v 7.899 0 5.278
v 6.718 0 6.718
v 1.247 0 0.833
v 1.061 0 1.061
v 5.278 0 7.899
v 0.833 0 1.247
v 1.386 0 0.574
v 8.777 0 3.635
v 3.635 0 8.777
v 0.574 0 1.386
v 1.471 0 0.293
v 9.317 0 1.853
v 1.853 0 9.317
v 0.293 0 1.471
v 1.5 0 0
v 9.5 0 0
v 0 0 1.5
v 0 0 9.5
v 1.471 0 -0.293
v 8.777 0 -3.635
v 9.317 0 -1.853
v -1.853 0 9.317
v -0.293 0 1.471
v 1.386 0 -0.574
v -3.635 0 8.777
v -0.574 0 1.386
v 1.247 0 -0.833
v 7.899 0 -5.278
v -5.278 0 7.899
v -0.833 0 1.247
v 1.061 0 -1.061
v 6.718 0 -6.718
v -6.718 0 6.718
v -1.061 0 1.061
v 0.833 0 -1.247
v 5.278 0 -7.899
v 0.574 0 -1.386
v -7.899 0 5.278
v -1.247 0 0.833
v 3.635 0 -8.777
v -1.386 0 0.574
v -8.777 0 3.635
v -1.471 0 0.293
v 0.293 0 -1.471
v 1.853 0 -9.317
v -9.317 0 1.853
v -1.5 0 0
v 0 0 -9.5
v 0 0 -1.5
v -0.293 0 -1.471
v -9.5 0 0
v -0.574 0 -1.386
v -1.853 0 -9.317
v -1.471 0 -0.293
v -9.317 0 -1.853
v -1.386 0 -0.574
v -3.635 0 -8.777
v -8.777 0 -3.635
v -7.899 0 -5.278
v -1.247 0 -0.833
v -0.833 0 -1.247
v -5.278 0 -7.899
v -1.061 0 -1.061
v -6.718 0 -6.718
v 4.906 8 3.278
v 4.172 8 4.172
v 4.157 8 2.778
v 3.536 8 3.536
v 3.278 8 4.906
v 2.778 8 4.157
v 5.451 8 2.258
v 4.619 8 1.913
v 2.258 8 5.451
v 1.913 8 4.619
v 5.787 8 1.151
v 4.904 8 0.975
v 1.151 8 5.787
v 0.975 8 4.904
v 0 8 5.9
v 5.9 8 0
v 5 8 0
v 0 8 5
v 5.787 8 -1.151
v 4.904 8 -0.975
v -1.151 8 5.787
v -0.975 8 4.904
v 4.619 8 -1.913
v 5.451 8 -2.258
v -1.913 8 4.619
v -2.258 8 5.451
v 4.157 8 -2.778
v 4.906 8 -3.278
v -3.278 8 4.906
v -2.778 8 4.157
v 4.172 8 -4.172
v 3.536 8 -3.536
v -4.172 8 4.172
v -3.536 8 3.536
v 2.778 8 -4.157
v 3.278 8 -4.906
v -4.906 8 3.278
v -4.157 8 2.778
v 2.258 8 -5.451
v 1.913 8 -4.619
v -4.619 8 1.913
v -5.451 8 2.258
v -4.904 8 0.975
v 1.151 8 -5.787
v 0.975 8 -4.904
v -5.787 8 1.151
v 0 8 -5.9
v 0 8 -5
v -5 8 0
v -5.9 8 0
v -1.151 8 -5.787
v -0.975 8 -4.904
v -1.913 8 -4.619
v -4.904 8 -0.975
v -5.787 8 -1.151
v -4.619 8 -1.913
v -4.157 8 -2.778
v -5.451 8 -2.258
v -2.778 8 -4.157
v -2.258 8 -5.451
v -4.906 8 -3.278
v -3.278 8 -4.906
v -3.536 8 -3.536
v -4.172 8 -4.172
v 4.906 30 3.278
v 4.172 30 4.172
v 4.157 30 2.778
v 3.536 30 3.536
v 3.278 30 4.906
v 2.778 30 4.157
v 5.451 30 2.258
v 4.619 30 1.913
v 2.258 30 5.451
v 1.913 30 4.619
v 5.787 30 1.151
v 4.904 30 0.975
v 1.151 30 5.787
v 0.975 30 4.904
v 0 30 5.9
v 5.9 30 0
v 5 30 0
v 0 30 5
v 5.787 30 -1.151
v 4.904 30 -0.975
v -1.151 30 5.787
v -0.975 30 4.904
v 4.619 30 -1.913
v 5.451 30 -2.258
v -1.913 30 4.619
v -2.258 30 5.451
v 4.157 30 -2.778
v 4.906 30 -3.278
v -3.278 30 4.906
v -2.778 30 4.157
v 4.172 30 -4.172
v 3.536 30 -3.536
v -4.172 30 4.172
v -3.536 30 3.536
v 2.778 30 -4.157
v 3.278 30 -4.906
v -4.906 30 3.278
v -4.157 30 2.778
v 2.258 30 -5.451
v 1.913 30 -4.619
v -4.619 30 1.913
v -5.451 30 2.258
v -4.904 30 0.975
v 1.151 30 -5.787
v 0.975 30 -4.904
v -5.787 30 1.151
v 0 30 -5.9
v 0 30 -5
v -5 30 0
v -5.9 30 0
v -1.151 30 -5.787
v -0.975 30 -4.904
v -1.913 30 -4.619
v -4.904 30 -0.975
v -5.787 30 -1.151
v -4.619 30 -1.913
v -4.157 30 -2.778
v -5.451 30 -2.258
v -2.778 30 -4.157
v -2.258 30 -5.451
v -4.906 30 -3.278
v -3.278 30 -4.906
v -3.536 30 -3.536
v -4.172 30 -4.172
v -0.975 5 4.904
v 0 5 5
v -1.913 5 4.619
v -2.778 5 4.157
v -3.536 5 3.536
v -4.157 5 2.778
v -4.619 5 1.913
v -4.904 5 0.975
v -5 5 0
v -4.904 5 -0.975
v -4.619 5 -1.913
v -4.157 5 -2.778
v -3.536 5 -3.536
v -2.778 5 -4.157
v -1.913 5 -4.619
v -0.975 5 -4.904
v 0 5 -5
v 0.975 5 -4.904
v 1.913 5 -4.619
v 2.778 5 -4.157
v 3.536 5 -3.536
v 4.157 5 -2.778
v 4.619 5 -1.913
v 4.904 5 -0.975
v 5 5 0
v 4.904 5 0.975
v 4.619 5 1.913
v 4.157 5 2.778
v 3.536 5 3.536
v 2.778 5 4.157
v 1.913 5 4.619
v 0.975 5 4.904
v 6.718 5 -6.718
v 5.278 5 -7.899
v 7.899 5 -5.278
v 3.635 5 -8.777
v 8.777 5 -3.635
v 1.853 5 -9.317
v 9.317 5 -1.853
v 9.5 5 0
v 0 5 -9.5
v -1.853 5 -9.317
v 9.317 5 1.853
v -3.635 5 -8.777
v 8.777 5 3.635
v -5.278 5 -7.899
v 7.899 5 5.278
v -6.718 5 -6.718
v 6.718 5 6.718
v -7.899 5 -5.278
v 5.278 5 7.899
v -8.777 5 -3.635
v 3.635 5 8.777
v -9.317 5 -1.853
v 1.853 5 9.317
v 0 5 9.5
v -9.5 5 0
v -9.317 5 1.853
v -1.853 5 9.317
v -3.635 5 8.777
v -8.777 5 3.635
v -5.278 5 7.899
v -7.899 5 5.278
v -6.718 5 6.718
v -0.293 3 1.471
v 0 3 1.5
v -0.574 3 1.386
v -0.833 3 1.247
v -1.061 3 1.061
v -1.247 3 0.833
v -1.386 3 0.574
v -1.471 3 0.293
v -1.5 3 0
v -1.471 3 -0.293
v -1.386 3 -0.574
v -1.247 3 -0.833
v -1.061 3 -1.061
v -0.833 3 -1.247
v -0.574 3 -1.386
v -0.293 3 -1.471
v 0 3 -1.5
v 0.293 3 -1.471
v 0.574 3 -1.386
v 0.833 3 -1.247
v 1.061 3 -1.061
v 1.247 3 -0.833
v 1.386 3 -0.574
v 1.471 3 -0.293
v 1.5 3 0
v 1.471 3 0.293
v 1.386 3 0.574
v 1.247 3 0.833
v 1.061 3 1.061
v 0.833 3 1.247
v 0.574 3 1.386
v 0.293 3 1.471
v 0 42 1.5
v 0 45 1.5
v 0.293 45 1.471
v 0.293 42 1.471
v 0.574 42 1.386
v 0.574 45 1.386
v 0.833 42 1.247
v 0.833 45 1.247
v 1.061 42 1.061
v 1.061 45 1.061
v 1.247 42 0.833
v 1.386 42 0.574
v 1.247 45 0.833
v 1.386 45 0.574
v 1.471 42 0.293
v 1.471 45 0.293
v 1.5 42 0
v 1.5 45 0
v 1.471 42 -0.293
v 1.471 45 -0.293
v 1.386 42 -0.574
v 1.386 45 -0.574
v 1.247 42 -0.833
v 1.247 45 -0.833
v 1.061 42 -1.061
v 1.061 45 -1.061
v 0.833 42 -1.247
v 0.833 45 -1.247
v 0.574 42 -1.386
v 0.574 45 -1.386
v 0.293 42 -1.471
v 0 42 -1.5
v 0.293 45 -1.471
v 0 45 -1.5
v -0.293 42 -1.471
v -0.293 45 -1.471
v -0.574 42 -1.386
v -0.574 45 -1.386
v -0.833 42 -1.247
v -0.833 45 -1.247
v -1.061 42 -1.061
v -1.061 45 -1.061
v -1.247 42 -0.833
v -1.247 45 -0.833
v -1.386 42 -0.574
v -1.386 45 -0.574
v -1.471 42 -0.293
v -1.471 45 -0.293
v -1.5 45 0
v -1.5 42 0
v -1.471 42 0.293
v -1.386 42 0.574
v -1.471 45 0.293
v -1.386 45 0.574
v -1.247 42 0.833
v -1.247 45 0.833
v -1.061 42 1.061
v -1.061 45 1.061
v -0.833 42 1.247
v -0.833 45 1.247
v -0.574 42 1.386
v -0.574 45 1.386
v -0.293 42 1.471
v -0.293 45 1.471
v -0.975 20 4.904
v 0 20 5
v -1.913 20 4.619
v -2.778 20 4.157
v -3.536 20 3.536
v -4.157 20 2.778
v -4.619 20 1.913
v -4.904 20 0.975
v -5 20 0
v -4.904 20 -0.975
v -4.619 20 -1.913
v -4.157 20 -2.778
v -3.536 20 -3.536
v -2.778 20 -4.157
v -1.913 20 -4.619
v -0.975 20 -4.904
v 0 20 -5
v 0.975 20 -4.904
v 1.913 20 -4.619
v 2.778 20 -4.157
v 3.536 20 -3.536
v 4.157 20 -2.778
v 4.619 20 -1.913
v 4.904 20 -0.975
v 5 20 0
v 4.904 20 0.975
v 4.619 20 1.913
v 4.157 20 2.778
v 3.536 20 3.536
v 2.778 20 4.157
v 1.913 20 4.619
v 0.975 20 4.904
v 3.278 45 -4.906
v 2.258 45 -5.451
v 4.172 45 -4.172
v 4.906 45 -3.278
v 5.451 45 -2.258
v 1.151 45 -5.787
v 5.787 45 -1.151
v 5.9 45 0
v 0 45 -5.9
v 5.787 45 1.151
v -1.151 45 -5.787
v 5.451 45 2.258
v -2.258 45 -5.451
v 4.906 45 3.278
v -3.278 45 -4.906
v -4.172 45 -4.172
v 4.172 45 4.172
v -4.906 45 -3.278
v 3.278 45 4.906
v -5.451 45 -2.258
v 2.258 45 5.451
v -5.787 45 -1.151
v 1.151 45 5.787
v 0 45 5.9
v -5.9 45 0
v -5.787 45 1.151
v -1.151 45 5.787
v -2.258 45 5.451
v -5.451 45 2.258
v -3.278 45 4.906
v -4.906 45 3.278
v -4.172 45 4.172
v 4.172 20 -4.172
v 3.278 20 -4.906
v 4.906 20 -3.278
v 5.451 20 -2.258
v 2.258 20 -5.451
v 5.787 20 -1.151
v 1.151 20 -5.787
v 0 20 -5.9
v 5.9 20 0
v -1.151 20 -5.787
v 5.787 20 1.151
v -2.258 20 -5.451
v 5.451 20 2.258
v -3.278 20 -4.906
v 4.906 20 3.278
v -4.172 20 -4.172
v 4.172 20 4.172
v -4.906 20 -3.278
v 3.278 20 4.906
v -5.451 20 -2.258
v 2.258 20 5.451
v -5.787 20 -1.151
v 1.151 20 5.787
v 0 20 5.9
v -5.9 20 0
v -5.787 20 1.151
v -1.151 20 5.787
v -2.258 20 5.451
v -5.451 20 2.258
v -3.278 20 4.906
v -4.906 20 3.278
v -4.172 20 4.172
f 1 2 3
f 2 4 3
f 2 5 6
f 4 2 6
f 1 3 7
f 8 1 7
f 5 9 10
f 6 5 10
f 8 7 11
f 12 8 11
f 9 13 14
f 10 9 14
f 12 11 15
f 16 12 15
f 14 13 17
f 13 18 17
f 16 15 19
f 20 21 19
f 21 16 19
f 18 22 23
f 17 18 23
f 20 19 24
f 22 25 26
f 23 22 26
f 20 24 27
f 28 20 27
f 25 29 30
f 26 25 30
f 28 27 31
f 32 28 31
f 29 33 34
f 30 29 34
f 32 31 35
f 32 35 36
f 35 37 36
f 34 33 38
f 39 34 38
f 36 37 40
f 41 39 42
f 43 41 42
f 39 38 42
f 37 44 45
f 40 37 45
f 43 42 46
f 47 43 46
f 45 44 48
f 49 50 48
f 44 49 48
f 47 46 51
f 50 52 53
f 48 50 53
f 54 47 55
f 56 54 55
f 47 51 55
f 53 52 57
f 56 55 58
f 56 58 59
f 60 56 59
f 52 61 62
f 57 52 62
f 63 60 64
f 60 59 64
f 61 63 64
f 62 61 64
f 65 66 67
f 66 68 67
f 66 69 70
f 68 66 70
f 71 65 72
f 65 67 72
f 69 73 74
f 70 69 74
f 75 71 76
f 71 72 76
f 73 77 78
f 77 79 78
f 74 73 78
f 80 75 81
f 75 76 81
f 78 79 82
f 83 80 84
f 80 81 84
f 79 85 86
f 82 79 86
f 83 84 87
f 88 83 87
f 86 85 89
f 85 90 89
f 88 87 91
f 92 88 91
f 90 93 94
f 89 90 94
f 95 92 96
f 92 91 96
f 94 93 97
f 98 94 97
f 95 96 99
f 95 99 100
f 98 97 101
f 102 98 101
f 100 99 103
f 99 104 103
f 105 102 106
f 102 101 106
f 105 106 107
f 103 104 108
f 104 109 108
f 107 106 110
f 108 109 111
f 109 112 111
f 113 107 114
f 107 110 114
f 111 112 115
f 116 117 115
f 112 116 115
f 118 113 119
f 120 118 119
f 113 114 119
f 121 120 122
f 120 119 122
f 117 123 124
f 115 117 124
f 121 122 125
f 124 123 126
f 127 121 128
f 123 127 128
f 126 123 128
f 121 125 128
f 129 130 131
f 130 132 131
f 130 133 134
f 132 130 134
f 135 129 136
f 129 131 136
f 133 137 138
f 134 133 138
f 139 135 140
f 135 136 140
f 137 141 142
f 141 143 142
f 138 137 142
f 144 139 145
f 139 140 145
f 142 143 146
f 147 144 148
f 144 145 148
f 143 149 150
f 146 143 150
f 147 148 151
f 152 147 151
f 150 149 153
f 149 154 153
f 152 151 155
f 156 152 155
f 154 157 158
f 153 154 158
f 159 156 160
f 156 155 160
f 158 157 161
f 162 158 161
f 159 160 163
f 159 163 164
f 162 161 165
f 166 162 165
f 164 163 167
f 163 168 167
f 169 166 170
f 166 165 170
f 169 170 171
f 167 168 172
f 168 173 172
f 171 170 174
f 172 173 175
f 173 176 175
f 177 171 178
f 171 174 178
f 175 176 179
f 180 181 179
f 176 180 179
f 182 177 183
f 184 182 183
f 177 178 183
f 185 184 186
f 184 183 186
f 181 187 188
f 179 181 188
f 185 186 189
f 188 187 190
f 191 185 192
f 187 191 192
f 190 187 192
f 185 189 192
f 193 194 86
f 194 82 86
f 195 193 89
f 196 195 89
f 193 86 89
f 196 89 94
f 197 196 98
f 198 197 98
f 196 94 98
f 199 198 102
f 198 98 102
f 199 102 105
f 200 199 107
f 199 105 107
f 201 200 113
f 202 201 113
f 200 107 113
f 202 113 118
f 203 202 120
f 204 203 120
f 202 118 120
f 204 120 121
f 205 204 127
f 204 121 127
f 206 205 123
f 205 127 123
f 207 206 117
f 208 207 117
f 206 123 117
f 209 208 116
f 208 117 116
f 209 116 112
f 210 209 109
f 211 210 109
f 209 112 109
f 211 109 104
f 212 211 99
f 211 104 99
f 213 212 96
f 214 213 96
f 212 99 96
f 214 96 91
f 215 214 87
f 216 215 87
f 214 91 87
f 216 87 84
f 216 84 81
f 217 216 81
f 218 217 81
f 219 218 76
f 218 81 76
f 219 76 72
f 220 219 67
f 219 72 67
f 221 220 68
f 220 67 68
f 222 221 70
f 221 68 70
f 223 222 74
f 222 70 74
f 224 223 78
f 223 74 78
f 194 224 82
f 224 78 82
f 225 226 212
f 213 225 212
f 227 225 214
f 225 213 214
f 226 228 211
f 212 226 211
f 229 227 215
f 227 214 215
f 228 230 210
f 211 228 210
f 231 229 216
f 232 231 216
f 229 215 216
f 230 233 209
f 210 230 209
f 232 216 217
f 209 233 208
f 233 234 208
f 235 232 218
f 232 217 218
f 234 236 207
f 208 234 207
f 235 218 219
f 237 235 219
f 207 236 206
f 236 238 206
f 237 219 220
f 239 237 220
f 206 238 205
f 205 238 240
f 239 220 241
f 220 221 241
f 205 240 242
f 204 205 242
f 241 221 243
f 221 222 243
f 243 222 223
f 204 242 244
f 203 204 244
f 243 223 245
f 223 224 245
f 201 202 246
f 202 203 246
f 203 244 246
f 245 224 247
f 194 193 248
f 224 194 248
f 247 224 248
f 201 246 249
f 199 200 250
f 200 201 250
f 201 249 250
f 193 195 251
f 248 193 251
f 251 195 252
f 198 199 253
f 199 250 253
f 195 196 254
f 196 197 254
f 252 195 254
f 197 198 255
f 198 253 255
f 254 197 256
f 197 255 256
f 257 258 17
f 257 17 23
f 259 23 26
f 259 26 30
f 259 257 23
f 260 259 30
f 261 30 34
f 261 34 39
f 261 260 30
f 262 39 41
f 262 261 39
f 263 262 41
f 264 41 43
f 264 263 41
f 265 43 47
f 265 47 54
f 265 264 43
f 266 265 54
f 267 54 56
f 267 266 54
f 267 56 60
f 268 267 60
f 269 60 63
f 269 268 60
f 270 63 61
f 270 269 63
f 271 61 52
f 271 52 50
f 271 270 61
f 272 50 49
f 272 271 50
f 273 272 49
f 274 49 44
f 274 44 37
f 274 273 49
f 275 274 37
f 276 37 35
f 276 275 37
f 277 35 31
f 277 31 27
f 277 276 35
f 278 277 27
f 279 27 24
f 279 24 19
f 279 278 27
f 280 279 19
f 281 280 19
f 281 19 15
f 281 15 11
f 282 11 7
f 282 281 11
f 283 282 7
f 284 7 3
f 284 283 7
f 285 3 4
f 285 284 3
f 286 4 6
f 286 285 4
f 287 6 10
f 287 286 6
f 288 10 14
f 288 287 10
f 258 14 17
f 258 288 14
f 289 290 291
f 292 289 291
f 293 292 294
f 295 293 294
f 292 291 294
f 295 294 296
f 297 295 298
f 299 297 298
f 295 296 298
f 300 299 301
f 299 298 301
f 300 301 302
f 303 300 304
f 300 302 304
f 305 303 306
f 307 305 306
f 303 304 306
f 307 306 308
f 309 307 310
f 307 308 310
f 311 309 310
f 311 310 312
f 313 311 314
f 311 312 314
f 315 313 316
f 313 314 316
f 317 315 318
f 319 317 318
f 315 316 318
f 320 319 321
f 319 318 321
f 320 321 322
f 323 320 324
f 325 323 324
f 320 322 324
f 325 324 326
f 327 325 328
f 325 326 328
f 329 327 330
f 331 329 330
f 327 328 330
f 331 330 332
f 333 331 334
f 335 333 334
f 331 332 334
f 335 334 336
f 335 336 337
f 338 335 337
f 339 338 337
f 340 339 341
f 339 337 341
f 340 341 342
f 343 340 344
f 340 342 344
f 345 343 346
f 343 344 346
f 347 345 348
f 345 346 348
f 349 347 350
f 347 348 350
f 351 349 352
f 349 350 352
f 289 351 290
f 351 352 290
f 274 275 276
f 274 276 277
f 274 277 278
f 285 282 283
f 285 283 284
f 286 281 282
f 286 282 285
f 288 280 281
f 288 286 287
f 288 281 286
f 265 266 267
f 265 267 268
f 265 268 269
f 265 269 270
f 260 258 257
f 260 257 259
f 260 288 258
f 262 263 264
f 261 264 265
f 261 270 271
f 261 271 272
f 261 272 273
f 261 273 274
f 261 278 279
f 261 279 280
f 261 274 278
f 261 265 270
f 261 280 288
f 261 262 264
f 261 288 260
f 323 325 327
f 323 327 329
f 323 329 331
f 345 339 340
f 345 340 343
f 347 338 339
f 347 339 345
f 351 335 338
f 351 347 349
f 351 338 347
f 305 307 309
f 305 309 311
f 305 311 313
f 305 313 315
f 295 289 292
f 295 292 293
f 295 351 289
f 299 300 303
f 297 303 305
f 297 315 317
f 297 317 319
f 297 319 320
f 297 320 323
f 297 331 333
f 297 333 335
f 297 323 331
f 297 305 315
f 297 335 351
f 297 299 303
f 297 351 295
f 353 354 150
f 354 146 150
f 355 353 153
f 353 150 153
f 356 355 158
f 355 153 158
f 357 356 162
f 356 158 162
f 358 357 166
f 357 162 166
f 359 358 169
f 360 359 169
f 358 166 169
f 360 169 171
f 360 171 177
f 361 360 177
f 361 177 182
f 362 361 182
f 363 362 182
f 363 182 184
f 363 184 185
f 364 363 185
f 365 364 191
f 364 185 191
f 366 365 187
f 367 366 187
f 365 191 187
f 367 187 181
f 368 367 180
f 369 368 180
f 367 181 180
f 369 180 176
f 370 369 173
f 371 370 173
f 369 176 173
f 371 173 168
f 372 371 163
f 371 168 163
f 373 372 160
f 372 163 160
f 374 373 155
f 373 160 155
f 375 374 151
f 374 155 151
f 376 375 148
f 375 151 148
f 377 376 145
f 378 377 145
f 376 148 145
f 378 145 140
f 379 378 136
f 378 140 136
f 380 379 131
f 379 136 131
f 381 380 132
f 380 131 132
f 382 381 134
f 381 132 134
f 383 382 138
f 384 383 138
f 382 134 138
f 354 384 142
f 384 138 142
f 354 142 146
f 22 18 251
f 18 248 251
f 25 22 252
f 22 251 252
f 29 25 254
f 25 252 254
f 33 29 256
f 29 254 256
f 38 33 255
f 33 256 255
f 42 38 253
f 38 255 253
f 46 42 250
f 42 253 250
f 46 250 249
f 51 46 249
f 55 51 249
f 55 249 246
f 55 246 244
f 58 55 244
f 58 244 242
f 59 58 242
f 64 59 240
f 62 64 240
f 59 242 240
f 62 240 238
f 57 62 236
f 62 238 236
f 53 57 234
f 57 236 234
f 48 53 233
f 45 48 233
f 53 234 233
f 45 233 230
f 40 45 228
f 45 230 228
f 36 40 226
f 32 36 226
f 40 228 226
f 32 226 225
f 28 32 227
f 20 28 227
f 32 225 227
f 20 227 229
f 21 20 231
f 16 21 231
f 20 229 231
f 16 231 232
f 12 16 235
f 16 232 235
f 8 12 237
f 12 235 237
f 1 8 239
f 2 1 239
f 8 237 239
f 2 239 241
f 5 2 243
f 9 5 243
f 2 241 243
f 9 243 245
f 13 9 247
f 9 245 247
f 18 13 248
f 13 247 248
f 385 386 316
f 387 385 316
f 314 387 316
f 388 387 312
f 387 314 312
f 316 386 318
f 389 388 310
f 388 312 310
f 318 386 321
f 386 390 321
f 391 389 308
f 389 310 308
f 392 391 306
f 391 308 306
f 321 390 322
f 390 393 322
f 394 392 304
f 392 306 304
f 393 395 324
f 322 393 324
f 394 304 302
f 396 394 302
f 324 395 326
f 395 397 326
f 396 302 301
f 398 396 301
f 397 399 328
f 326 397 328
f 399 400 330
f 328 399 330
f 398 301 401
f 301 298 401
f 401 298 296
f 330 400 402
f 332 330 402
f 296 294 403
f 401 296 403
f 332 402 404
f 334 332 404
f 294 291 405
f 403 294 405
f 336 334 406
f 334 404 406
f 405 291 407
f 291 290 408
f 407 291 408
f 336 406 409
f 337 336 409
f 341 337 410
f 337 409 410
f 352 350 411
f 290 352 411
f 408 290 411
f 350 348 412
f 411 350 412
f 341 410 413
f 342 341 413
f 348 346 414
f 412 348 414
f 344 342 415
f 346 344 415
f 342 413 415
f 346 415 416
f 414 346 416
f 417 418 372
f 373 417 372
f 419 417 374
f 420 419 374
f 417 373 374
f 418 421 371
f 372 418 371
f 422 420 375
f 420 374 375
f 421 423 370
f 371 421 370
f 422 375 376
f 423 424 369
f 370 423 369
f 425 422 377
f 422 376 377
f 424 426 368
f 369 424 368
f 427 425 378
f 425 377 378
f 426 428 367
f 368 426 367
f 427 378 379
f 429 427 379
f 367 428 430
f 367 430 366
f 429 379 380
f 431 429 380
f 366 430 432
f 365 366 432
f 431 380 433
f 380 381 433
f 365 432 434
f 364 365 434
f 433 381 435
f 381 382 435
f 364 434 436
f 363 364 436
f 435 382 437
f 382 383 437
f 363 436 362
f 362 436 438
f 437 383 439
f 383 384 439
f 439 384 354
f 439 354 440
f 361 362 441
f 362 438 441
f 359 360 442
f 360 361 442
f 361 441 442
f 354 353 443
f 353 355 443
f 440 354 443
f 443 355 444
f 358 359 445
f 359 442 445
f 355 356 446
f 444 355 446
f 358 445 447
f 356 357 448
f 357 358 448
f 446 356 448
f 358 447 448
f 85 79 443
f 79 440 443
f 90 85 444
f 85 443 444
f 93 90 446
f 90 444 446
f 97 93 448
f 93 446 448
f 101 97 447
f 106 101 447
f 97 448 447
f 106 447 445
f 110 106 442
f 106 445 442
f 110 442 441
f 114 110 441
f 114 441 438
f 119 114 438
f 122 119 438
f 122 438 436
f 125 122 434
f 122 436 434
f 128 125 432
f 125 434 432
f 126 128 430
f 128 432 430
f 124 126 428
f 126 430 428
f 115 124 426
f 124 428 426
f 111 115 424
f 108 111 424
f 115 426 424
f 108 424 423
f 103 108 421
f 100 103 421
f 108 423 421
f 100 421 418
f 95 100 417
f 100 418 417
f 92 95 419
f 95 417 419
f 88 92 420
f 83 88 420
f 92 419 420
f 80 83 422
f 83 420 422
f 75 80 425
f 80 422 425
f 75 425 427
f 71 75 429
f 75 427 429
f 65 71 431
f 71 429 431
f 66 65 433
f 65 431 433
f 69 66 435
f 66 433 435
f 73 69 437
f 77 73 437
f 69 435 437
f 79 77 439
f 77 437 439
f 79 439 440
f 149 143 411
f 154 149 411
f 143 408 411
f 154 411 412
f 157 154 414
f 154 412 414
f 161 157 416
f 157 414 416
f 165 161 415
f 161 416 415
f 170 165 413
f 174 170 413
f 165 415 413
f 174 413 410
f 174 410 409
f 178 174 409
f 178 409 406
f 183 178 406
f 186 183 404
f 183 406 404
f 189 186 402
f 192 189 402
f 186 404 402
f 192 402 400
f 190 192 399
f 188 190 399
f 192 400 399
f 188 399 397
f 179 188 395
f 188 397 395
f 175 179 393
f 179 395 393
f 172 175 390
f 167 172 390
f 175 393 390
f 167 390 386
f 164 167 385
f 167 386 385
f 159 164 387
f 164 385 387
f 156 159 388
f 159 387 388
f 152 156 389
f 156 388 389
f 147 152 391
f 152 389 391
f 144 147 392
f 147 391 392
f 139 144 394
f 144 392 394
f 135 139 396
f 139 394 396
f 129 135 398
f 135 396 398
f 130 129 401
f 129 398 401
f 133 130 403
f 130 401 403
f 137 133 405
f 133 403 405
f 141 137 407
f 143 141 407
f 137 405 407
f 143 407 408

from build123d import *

# Parameters (mm, degrees)
SKETCH_2_R          = 1.5
CUT_EXTRUDE_1_DEPTH = 3
CUT_EXTRUDE_START   = -3
SKETCH_3_R          = 1.5
CUT_EXTRUDE_2_DEPTH = 3


with BuildPart() as part:
    # Эскиз1 → Повернуть1 (revolve)
    with BuildSketch(Plane.XY, mode=Mode.PRIVATE) as revolve_1_sk:
        Polygon((0, 0), (9.5, 0), (9.5, 5), (5, 5), (5, 8), (5.9, 8), (5.9, 20), (5, 20), (5, 30), (5.9, 30), (5.9, 45), (0, 45), align=None)
    revolve(revolve_1_sk.sketch.rotate(Axis((0, 14.6467512, 0), (0, -1, 0)), 90), axis=Axis((0, 14.6467512, 0), (0, -1, 0)))

    # Эскиз2 → Вырез-Вытянуть1 (cut)
    with BuildSketch(Plane(origin=(0, 45, 0), x_dir=(1, 0, 0), z_dir=(0, 1, 0))):
        with Locations(Location((0, 0, 0), (0, 0, 270))):
            Circle(SKETCH_2_R)
    extrude(amount=-CUT_EXTRUDE_1_DEPTH, mode=Mode.SUBTRACT)

    # Эскиз3 → Вырез-Вытянуть2 (cut)
    with BuildSketch(Plane(origin=(0, 0, 0), x_dir=(-1, 0, 0), z_dir=(0, -1, 0)).offset(CUT_EXTRUDE_START)):
        with Locations(Location((0, 0, 0), (0, 0, 270))):
            Circle(SKETCH_3_R)
    extrude(amount=CUT_EXTRUDE_2_DEPTH, mode=Mode.SUBTRACT)


solid = part.part
